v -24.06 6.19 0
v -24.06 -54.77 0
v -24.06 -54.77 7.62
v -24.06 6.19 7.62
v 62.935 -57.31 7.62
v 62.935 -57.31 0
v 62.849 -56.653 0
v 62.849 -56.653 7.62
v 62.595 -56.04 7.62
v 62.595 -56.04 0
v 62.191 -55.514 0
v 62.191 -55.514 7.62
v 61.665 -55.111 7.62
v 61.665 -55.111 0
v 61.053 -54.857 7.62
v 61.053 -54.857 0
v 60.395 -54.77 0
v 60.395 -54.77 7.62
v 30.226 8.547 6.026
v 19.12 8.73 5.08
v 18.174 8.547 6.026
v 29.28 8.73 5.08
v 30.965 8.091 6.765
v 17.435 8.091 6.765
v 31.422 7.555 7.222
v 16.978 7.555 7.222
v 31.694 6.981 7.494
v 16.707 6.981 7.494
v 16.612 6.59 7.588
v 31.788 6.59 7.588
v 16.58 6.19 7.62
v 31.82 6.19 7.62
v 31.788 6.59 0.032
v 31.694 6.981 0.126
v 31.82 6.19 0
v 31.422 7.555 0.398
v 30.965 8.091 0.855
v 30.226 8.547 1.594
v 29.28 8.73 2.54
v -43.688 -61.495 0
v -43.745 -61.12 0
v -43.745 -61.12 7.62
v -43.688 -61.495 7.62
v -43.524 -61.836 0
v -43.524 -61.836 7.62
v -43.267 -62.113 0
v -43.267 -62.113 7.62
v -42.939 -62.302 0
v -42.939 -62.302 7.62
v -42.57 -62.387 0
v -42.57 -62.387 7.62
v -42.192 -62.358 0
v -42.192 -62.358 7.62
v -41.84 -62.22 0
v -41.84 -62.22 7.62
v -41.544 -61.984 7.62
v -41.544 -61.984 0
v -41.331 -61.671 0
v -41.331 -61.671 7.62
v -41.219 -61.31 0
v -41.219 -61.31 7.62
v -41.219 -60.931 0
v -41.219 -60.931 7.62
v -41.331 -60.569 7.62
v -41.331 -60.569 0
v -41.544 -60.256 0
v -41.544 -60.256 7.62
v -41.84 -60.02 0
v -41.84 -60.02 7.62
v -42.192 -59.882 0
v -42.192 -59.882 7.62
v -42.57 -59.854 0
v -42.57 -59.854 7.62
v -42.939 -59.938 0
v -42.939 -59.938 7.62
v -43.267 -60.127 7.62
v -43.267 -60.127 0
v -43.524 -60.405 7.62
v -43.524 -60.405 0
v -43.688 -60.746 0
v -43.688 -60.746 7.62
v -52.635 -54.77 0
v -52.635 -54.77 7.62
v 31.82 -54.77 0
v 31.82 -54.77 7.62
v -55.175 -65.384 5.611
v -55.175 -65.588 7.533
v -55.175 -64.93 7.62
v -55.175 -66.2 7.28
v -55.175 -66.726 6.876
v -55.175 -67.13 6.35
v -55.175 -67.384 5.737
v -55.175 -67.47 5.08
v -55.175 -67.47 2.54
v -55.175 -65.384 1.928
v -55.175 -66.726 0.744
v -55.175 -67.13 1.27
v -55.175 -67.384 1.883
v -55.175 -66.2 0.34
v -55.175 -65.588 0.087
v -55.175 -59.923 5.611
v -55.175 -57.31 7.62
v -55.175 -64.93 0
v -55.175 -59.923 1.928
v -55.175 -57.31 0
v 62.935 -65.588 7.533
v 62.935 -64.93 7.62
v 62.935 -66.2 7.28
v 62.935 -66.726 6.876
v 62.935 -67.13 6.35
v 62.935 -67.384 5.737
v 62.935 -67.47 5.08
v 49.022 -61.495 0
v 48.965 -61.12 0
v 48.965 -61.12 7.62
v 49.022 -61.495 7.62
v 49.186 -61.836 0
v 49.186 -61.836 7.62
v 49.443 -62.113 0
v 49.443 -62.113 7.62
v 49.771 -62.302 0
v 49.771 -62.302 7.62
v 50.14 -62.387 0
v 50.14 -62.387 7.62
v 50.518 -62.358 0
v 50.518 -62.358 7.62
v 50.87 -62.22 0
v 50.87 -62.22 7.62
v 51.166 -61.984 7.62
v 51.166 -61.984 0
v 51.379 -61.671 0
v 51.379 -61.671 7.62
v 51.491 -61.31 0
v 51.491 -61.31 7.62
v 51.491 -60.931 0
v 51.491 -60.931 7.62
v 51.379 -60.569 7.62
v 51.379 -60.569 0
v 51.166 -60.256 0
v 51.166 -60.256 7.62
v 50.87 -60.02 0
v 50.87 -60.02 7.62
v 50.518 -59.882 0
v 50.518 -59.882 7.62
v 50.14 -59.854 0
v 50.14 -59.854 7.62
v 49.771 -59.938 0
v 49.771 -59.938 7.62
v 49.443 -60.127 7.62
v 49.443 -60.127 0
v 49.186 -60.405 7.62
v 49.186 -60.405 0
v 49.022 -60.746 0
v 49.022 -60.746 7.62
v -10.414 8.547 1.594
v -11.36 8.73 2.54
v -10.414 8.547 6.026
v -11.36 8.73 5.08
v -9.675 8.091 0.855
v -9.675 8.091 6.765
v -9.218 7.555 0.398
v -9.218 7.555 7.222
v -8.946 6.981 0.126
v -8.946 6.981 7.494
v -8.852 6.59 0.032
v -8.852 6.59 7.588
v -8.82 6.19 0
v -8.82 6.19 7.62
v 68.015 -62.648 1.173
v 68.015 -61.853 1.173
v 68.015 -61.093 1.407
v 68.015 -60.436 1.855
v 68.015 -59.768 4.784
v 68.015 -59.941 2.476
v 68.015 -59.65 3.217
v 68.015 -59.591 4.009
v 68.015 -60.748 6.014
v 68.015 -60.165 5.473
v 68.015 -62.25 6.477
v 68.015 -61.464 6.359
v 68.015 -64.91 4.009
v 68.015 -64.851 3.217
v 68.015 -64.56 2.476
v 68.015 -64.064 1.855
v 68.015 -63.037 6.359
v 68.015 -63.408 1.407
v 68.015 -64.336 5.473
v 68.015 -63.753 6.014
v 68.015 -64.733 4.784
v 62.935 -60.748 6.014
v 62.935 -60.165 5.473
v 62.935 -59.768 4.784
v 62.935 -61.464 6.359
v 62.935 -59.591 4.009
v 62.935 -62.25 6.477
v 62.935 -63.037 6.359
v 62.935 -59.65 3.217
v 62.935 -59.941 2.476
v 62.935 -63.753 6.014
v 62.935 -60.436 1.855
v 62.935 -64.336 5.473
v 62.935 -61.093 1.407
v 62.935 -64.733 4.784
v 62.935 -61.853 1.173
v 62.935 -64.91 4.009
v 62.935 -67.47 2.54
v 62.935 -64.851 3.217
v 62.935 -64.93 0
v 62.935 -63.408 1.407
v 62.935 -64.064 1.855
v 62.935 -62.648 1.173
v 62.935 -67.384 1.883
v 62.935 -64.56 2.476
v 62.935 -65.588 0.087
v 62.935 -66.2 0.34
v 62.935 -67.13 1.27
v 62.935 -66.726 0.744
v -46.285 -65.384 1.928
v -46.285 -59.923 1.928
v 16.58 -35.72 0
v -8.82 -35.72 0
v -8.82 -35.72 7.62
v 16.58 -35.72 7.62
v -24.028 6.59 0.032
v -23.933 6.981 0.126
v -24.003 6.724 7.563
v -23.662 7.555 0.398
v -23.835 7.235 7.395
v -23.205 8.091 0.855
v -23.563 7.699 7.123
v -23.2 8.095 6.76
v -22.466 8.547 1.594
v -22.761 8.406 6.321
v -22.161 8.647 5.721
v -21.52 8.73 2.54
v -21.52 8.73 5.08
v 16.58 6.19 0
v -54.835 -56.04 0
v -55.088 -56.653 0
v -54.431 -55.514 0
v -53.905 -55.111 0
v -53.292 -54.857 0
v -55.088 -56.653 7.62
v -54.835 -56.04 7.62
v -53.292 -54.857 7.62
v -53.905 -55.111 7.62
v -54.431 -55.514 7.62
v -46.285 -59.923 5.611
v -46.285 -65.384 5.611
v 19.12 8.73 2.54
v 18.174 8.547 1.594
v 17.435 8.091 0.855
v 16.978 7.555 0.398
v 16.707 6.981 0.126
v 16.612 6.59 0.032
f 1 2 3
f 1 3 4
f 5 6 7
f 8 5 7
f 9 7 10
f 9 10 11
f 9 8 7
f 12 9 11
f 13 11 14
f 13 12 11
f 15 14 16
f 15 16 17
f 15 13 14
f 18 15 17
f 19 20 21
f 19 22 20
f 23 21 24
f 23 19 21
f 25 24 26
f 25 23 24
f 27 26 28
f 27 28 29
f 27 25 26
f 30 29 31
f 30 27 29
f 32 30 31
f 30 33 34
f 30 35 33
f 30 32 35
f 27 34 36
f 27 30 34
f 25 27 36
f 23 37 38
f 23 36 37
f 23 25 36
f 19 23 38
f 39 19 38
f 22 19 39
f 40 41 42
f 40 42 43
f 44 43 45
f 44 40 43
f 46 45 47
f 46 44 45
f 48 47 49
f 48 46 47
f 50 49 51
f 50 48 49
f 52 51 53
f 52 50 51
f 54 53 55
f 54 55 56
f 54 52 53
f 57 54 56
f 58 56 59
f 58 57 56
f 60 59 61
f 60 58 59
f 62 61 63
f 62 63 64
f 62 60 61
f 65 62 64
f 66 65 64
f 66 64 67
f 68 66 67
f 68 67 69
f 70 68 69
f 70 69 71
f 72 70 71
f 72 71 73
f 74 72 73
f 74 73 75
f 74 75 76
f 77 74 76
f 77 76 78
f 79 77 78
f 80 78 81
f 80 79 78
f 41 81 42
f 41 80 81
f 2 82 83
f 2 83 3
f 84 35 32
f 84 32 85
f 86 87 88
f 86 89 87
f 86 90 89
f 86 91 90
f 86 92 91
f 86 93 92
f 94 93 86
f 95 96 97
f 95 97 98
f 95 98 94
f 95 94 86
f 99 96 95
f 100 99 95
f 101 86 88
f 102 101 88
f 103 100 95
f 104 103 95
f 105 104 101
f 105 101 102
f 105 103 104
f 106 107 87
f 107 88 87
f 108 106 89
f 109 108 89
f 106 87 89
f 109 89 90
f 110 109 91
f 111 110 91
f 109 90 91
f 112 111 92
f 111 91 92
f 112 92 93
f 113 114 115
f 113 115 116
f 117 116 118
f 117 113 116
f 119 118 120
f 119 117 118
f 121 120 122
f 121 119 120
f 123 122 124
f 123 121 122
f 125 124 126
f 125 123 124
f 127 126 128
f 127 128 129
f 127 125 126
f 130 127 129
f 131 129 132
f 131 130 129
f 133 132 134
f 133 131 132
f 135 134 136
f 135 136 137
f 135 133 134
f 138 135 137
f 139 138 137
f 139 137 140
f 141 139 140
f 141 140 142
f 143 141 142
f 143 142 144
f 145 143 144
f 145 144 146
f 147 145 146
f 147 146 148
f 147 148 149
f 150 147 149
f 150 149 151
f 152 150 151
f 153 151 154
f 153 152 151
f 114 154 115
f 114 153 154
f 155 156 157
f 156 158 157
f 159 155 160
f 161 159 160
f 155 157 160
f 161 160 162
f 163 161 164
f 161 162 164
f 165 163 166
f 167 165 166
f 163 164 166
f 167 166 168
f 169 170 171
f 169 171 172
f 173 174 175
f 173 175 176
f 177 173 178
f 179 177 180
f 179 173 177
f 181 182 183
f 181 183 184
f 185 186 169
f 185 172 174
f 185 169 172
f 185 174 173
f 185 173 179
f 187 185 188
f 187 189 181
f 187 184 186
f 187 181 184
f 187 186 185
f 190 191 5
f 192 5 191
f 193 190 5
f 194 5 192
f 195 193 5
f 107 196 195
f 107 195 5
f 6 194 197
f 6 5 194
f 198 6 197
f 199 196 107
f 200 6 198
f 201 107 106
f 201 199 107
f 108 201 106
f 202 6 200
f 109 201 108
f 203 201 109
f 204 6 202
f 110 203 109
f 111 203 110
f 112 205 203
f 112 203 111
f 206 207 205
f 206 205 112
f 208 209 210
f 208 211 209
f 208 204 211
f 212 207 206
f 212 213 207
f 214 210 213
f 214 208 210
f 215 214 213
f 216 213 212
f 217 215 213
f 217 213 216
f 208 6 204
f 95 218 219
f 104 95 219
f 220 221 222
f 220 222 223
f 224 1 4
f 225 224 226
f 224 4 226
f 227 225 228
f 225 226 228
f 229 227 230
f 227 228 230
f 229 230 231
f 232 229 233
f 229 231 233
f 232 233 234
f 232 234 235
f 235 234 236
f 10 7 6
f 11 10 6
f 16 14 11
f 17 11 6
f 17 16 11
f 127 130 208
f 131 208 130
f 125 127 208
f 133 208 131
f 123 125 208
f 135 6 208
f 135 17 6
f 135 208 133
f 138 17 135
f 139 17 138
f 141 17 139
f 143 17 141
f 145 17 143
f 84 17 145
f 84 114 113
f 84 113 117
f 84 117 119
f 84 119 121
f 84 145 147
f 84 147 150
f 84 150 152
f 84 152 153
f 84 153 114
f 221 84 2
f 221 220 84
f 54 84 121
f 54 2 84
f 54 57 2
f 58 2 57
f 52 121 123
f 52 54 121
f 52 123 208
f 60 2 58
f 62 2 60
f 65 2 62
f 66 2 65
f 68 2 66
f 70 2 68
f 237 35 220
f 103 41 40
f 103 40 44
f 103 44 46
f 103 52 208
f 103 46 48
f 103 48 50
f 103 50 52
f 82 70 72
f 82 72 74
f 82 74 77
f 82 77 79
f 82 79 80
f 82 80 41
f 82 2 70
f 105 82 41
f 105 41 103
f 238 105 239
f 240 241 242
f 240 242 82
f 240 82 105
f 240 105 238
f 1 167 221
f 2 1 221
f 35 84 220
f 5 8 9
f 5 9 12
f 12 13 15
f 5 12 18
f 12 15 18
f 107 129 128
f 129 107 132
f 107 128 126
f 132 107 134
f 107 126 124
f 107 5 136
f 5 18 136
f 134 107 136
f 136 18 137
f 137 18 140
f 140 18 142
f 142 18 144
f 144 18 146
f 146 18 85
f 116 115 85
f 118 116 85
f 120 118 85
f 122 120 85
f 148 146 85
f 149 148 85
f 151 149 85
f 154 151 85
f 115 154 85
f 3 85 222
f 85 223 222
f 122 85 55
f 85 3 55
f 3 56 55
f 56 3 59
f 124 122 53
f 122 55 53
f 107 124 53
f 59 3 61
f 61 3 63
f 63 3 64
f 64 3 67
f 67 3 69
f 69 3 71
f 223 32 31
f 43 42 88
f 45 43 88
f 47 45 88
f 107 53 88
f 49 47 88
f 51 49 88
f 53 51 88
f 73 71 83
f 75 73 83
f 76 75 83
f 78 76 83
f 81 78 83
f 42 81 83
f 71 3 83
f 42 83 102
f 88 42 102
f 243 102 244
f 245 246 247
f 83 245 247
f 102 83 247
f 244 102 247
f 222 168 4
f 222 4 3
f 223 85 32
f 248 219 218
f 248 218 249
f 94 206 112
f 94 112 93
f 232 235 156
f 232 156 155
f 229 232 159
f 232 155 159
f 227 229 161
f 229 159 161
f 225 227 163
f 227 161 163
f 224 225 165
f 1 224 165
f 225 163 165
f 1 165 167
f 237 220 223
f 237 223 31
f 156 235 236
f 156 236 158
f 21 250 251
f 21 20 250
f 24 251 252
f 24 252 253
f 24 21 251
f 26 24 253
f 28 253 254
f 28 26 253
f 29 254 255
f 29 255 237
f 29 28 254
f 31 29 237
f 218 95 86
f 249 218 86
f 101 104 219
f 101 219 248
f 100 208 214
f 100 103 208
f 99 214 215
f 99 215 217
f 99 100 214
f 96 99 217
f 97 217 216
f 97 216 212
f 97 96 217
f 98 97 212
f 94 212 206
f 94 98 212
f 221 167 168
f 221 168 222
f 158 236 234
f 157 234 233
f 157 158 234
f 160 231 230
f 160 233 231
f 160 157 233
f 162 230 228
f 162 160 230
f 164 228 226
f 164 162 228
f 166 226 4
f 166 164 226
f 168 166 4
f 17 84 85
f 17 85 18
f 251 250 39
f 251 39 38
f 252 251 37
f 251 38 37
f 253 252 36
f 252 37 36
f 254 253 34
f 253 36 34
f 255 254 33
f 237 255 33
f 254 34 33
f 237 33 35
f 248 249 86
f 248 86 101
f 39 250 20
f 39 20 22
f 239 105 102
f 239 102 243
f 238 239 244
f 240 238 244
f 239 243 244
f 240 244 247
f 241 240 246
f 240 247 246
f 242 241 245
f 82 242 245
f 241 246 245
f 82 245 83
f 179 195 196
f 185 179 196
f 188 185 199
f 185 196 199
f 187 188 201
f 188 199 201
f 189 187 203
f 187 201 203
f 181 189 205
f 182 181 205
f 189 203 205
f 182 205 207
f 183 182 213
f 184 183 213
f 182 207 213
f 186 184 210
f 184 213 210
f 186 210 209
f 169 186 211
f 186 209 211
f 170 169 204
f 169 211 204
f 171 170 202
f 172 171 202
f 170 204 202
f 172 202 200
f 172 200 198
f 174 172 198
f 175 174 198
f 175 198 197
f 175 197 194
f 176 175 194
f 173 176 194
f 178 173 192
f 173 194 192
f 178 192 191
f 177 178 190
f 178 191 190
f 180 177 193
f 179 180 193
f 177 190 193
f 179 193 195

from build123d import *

# Parameters (mm, degrees)
SKETCH1_R           = 1.27
BOSS_EXTRUDE1_DEPTH = 7.62
FILLET1_R           = 2.54
FILLET2_R           = 2.54
FILLET3_R           = 2.54
SKETCH4_R           = 2.667
BOSS_EXTRUDE2_DEPTH = 5.08
SKETCH5_W           = 3.683
SKETCH5_H           = 5.461
CUT_EXTRUDE2_DEPTH  = 8.89


with BuildPart() as part:
    # Sketch1 → Boss-Extrude1 (new body)
    with BuildSketch(Plane.XY):
        Polygon((-55.174879418, -67.47023925), (-55.174879418, -54.77023925), (-24.059879418, -54.77023925), (-24.059879418, 8.72976075), (-8.819879418, 8.72976075), (-8.819879418, -35.72023925), (16.580120582, -35.72023925), (16.580120582, 8.72976075), (31.820120582, 8.72976075), (31.820120582, -54.77023925), (62.935120582, -54.77023925), (62.935120582, -67.47023925), align=None)
        with Locations(Location((-42.474879418, -61.12023925, 0), (0, 0, 180))):
            Circle(SKETCH1_R, mode=Mode.SUBTRACT)
        with Locations(Location((50.235120582, -61.12023925, 0), (0, 0, 180))):
            Circle(SKETCH1_R, mode=Mode.SUBTRACT)
    extrude(amount=BOSS_EXTRUDE1_DEPTH)

    # Fillet1
    fillet1_edges = [part.edges().sort_by_distance(p)[0] for p in [
        (-16.439879418, 8.72976075, 0),
        (24.200120582, 8.72976075, 0),
        (24.200120582, 8.72976075, 7.62),
        (-24.059879418, 8.72976075, 3.81),
        (-8.819879418, 8.72976075, 3.81),
        (16.580120582, 8.72976075, 3.81),
        (31.820120582, 8.72976075, 3.81),
        (-16.439879418, 8.72976075, 7.62),
    ]]
    fillet(fillet1_edges, radius=FILLET1_R)

    # Fillet2
    fillet2_edges = [part.edges().sort_by_distance(p)[0] for p in [
        (3.880120582, -67.47023925, 0),
        (3.880120582, -67.47023925, 7.62),
    ]]
    fillet(fillet2_edges, radius=FILLET2_R)

    # Fillet3
    fillet3_edges = [part.edges().sort_by_distance(p)[0] for p in [
        (-55.174879418, -54.77023925, 3.81),
        (62.935120582, -54.77023925, 3.81),
    ]]
    fillet(fillet3_edges, radius=FILLET3_R)

    # Sketch4 → Boss-Extrude2 (add)
    with BuildSketch(Plane(origin=(62.935120582, 0, 0), x_dir=(0, 0, -1), z_dir=(1, 0, 0))):
        with Locations(Location((-3.81, -62.250449816, 0), (0, 0, 180))):
            Circle(SKETCH4_R)
    extrude(amount=BOSS_EXTRUDE2_DEPTH)

    # Sketch5 → Cut-Extrude2 (cut)
    with BuildSketch(Plane.ZY.offset(55.174879418)):
        with Locations((3.769019213, -62.653923663)):
            Rectangle(SKETCH5_W, SKETCH5_H)
    extrude(amount=-CUT_EXTRUDE2_DEPTH, mode=Mode.SUBTRACT)


solid = part.part
